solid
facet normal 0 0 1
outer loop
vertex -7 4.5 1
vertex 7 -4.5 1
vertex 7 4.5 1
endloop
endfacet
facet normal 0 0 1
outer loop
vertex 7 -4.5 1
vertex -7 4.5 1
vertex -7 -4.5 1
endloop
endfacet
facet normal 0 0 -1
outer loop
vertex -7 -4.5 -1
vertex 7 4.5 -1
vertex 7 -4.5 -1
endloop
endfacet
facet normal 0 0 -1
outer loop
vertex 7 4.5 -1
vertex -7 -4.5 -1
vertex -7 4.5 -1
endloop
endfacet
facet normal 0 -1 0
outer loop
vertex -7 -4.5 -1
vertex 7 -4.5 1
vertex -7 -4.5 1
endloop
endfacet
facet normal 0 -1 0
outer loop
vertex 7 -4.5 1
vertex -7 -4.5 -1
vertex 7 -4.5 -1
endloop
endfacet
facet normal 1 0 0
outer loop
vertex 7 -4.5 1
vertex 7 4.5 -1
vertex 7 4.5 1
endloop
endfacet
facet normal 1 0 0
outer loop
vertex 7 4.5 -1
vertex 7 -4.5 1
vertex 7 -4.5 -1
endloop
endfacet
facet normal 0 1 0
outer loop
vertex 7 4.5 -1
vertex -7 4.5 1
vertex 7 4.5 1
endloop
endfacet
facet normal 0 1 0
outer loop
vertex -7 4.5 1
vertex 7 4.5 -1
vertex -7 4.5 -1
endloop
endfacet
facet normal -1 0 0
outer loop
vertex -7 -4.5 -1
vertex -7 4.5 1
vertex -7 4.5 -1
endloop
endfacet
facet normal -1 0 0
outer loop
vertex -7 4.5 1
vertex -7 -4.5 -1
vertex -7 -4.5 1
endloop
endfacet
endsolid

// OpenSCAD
function compartment_organizer_w() = 14;
function compartment_organizer_d() = 9;
function compartment_organizer_h() = 2;

module compartment_organizer() {
  color("orange", 0.5)
  cube(size=[
      compartment_organizer_w(),
      compartment_organizer_d(),
      compartment_organizer_h()],
    center=true);
}

compartment_organizer();
